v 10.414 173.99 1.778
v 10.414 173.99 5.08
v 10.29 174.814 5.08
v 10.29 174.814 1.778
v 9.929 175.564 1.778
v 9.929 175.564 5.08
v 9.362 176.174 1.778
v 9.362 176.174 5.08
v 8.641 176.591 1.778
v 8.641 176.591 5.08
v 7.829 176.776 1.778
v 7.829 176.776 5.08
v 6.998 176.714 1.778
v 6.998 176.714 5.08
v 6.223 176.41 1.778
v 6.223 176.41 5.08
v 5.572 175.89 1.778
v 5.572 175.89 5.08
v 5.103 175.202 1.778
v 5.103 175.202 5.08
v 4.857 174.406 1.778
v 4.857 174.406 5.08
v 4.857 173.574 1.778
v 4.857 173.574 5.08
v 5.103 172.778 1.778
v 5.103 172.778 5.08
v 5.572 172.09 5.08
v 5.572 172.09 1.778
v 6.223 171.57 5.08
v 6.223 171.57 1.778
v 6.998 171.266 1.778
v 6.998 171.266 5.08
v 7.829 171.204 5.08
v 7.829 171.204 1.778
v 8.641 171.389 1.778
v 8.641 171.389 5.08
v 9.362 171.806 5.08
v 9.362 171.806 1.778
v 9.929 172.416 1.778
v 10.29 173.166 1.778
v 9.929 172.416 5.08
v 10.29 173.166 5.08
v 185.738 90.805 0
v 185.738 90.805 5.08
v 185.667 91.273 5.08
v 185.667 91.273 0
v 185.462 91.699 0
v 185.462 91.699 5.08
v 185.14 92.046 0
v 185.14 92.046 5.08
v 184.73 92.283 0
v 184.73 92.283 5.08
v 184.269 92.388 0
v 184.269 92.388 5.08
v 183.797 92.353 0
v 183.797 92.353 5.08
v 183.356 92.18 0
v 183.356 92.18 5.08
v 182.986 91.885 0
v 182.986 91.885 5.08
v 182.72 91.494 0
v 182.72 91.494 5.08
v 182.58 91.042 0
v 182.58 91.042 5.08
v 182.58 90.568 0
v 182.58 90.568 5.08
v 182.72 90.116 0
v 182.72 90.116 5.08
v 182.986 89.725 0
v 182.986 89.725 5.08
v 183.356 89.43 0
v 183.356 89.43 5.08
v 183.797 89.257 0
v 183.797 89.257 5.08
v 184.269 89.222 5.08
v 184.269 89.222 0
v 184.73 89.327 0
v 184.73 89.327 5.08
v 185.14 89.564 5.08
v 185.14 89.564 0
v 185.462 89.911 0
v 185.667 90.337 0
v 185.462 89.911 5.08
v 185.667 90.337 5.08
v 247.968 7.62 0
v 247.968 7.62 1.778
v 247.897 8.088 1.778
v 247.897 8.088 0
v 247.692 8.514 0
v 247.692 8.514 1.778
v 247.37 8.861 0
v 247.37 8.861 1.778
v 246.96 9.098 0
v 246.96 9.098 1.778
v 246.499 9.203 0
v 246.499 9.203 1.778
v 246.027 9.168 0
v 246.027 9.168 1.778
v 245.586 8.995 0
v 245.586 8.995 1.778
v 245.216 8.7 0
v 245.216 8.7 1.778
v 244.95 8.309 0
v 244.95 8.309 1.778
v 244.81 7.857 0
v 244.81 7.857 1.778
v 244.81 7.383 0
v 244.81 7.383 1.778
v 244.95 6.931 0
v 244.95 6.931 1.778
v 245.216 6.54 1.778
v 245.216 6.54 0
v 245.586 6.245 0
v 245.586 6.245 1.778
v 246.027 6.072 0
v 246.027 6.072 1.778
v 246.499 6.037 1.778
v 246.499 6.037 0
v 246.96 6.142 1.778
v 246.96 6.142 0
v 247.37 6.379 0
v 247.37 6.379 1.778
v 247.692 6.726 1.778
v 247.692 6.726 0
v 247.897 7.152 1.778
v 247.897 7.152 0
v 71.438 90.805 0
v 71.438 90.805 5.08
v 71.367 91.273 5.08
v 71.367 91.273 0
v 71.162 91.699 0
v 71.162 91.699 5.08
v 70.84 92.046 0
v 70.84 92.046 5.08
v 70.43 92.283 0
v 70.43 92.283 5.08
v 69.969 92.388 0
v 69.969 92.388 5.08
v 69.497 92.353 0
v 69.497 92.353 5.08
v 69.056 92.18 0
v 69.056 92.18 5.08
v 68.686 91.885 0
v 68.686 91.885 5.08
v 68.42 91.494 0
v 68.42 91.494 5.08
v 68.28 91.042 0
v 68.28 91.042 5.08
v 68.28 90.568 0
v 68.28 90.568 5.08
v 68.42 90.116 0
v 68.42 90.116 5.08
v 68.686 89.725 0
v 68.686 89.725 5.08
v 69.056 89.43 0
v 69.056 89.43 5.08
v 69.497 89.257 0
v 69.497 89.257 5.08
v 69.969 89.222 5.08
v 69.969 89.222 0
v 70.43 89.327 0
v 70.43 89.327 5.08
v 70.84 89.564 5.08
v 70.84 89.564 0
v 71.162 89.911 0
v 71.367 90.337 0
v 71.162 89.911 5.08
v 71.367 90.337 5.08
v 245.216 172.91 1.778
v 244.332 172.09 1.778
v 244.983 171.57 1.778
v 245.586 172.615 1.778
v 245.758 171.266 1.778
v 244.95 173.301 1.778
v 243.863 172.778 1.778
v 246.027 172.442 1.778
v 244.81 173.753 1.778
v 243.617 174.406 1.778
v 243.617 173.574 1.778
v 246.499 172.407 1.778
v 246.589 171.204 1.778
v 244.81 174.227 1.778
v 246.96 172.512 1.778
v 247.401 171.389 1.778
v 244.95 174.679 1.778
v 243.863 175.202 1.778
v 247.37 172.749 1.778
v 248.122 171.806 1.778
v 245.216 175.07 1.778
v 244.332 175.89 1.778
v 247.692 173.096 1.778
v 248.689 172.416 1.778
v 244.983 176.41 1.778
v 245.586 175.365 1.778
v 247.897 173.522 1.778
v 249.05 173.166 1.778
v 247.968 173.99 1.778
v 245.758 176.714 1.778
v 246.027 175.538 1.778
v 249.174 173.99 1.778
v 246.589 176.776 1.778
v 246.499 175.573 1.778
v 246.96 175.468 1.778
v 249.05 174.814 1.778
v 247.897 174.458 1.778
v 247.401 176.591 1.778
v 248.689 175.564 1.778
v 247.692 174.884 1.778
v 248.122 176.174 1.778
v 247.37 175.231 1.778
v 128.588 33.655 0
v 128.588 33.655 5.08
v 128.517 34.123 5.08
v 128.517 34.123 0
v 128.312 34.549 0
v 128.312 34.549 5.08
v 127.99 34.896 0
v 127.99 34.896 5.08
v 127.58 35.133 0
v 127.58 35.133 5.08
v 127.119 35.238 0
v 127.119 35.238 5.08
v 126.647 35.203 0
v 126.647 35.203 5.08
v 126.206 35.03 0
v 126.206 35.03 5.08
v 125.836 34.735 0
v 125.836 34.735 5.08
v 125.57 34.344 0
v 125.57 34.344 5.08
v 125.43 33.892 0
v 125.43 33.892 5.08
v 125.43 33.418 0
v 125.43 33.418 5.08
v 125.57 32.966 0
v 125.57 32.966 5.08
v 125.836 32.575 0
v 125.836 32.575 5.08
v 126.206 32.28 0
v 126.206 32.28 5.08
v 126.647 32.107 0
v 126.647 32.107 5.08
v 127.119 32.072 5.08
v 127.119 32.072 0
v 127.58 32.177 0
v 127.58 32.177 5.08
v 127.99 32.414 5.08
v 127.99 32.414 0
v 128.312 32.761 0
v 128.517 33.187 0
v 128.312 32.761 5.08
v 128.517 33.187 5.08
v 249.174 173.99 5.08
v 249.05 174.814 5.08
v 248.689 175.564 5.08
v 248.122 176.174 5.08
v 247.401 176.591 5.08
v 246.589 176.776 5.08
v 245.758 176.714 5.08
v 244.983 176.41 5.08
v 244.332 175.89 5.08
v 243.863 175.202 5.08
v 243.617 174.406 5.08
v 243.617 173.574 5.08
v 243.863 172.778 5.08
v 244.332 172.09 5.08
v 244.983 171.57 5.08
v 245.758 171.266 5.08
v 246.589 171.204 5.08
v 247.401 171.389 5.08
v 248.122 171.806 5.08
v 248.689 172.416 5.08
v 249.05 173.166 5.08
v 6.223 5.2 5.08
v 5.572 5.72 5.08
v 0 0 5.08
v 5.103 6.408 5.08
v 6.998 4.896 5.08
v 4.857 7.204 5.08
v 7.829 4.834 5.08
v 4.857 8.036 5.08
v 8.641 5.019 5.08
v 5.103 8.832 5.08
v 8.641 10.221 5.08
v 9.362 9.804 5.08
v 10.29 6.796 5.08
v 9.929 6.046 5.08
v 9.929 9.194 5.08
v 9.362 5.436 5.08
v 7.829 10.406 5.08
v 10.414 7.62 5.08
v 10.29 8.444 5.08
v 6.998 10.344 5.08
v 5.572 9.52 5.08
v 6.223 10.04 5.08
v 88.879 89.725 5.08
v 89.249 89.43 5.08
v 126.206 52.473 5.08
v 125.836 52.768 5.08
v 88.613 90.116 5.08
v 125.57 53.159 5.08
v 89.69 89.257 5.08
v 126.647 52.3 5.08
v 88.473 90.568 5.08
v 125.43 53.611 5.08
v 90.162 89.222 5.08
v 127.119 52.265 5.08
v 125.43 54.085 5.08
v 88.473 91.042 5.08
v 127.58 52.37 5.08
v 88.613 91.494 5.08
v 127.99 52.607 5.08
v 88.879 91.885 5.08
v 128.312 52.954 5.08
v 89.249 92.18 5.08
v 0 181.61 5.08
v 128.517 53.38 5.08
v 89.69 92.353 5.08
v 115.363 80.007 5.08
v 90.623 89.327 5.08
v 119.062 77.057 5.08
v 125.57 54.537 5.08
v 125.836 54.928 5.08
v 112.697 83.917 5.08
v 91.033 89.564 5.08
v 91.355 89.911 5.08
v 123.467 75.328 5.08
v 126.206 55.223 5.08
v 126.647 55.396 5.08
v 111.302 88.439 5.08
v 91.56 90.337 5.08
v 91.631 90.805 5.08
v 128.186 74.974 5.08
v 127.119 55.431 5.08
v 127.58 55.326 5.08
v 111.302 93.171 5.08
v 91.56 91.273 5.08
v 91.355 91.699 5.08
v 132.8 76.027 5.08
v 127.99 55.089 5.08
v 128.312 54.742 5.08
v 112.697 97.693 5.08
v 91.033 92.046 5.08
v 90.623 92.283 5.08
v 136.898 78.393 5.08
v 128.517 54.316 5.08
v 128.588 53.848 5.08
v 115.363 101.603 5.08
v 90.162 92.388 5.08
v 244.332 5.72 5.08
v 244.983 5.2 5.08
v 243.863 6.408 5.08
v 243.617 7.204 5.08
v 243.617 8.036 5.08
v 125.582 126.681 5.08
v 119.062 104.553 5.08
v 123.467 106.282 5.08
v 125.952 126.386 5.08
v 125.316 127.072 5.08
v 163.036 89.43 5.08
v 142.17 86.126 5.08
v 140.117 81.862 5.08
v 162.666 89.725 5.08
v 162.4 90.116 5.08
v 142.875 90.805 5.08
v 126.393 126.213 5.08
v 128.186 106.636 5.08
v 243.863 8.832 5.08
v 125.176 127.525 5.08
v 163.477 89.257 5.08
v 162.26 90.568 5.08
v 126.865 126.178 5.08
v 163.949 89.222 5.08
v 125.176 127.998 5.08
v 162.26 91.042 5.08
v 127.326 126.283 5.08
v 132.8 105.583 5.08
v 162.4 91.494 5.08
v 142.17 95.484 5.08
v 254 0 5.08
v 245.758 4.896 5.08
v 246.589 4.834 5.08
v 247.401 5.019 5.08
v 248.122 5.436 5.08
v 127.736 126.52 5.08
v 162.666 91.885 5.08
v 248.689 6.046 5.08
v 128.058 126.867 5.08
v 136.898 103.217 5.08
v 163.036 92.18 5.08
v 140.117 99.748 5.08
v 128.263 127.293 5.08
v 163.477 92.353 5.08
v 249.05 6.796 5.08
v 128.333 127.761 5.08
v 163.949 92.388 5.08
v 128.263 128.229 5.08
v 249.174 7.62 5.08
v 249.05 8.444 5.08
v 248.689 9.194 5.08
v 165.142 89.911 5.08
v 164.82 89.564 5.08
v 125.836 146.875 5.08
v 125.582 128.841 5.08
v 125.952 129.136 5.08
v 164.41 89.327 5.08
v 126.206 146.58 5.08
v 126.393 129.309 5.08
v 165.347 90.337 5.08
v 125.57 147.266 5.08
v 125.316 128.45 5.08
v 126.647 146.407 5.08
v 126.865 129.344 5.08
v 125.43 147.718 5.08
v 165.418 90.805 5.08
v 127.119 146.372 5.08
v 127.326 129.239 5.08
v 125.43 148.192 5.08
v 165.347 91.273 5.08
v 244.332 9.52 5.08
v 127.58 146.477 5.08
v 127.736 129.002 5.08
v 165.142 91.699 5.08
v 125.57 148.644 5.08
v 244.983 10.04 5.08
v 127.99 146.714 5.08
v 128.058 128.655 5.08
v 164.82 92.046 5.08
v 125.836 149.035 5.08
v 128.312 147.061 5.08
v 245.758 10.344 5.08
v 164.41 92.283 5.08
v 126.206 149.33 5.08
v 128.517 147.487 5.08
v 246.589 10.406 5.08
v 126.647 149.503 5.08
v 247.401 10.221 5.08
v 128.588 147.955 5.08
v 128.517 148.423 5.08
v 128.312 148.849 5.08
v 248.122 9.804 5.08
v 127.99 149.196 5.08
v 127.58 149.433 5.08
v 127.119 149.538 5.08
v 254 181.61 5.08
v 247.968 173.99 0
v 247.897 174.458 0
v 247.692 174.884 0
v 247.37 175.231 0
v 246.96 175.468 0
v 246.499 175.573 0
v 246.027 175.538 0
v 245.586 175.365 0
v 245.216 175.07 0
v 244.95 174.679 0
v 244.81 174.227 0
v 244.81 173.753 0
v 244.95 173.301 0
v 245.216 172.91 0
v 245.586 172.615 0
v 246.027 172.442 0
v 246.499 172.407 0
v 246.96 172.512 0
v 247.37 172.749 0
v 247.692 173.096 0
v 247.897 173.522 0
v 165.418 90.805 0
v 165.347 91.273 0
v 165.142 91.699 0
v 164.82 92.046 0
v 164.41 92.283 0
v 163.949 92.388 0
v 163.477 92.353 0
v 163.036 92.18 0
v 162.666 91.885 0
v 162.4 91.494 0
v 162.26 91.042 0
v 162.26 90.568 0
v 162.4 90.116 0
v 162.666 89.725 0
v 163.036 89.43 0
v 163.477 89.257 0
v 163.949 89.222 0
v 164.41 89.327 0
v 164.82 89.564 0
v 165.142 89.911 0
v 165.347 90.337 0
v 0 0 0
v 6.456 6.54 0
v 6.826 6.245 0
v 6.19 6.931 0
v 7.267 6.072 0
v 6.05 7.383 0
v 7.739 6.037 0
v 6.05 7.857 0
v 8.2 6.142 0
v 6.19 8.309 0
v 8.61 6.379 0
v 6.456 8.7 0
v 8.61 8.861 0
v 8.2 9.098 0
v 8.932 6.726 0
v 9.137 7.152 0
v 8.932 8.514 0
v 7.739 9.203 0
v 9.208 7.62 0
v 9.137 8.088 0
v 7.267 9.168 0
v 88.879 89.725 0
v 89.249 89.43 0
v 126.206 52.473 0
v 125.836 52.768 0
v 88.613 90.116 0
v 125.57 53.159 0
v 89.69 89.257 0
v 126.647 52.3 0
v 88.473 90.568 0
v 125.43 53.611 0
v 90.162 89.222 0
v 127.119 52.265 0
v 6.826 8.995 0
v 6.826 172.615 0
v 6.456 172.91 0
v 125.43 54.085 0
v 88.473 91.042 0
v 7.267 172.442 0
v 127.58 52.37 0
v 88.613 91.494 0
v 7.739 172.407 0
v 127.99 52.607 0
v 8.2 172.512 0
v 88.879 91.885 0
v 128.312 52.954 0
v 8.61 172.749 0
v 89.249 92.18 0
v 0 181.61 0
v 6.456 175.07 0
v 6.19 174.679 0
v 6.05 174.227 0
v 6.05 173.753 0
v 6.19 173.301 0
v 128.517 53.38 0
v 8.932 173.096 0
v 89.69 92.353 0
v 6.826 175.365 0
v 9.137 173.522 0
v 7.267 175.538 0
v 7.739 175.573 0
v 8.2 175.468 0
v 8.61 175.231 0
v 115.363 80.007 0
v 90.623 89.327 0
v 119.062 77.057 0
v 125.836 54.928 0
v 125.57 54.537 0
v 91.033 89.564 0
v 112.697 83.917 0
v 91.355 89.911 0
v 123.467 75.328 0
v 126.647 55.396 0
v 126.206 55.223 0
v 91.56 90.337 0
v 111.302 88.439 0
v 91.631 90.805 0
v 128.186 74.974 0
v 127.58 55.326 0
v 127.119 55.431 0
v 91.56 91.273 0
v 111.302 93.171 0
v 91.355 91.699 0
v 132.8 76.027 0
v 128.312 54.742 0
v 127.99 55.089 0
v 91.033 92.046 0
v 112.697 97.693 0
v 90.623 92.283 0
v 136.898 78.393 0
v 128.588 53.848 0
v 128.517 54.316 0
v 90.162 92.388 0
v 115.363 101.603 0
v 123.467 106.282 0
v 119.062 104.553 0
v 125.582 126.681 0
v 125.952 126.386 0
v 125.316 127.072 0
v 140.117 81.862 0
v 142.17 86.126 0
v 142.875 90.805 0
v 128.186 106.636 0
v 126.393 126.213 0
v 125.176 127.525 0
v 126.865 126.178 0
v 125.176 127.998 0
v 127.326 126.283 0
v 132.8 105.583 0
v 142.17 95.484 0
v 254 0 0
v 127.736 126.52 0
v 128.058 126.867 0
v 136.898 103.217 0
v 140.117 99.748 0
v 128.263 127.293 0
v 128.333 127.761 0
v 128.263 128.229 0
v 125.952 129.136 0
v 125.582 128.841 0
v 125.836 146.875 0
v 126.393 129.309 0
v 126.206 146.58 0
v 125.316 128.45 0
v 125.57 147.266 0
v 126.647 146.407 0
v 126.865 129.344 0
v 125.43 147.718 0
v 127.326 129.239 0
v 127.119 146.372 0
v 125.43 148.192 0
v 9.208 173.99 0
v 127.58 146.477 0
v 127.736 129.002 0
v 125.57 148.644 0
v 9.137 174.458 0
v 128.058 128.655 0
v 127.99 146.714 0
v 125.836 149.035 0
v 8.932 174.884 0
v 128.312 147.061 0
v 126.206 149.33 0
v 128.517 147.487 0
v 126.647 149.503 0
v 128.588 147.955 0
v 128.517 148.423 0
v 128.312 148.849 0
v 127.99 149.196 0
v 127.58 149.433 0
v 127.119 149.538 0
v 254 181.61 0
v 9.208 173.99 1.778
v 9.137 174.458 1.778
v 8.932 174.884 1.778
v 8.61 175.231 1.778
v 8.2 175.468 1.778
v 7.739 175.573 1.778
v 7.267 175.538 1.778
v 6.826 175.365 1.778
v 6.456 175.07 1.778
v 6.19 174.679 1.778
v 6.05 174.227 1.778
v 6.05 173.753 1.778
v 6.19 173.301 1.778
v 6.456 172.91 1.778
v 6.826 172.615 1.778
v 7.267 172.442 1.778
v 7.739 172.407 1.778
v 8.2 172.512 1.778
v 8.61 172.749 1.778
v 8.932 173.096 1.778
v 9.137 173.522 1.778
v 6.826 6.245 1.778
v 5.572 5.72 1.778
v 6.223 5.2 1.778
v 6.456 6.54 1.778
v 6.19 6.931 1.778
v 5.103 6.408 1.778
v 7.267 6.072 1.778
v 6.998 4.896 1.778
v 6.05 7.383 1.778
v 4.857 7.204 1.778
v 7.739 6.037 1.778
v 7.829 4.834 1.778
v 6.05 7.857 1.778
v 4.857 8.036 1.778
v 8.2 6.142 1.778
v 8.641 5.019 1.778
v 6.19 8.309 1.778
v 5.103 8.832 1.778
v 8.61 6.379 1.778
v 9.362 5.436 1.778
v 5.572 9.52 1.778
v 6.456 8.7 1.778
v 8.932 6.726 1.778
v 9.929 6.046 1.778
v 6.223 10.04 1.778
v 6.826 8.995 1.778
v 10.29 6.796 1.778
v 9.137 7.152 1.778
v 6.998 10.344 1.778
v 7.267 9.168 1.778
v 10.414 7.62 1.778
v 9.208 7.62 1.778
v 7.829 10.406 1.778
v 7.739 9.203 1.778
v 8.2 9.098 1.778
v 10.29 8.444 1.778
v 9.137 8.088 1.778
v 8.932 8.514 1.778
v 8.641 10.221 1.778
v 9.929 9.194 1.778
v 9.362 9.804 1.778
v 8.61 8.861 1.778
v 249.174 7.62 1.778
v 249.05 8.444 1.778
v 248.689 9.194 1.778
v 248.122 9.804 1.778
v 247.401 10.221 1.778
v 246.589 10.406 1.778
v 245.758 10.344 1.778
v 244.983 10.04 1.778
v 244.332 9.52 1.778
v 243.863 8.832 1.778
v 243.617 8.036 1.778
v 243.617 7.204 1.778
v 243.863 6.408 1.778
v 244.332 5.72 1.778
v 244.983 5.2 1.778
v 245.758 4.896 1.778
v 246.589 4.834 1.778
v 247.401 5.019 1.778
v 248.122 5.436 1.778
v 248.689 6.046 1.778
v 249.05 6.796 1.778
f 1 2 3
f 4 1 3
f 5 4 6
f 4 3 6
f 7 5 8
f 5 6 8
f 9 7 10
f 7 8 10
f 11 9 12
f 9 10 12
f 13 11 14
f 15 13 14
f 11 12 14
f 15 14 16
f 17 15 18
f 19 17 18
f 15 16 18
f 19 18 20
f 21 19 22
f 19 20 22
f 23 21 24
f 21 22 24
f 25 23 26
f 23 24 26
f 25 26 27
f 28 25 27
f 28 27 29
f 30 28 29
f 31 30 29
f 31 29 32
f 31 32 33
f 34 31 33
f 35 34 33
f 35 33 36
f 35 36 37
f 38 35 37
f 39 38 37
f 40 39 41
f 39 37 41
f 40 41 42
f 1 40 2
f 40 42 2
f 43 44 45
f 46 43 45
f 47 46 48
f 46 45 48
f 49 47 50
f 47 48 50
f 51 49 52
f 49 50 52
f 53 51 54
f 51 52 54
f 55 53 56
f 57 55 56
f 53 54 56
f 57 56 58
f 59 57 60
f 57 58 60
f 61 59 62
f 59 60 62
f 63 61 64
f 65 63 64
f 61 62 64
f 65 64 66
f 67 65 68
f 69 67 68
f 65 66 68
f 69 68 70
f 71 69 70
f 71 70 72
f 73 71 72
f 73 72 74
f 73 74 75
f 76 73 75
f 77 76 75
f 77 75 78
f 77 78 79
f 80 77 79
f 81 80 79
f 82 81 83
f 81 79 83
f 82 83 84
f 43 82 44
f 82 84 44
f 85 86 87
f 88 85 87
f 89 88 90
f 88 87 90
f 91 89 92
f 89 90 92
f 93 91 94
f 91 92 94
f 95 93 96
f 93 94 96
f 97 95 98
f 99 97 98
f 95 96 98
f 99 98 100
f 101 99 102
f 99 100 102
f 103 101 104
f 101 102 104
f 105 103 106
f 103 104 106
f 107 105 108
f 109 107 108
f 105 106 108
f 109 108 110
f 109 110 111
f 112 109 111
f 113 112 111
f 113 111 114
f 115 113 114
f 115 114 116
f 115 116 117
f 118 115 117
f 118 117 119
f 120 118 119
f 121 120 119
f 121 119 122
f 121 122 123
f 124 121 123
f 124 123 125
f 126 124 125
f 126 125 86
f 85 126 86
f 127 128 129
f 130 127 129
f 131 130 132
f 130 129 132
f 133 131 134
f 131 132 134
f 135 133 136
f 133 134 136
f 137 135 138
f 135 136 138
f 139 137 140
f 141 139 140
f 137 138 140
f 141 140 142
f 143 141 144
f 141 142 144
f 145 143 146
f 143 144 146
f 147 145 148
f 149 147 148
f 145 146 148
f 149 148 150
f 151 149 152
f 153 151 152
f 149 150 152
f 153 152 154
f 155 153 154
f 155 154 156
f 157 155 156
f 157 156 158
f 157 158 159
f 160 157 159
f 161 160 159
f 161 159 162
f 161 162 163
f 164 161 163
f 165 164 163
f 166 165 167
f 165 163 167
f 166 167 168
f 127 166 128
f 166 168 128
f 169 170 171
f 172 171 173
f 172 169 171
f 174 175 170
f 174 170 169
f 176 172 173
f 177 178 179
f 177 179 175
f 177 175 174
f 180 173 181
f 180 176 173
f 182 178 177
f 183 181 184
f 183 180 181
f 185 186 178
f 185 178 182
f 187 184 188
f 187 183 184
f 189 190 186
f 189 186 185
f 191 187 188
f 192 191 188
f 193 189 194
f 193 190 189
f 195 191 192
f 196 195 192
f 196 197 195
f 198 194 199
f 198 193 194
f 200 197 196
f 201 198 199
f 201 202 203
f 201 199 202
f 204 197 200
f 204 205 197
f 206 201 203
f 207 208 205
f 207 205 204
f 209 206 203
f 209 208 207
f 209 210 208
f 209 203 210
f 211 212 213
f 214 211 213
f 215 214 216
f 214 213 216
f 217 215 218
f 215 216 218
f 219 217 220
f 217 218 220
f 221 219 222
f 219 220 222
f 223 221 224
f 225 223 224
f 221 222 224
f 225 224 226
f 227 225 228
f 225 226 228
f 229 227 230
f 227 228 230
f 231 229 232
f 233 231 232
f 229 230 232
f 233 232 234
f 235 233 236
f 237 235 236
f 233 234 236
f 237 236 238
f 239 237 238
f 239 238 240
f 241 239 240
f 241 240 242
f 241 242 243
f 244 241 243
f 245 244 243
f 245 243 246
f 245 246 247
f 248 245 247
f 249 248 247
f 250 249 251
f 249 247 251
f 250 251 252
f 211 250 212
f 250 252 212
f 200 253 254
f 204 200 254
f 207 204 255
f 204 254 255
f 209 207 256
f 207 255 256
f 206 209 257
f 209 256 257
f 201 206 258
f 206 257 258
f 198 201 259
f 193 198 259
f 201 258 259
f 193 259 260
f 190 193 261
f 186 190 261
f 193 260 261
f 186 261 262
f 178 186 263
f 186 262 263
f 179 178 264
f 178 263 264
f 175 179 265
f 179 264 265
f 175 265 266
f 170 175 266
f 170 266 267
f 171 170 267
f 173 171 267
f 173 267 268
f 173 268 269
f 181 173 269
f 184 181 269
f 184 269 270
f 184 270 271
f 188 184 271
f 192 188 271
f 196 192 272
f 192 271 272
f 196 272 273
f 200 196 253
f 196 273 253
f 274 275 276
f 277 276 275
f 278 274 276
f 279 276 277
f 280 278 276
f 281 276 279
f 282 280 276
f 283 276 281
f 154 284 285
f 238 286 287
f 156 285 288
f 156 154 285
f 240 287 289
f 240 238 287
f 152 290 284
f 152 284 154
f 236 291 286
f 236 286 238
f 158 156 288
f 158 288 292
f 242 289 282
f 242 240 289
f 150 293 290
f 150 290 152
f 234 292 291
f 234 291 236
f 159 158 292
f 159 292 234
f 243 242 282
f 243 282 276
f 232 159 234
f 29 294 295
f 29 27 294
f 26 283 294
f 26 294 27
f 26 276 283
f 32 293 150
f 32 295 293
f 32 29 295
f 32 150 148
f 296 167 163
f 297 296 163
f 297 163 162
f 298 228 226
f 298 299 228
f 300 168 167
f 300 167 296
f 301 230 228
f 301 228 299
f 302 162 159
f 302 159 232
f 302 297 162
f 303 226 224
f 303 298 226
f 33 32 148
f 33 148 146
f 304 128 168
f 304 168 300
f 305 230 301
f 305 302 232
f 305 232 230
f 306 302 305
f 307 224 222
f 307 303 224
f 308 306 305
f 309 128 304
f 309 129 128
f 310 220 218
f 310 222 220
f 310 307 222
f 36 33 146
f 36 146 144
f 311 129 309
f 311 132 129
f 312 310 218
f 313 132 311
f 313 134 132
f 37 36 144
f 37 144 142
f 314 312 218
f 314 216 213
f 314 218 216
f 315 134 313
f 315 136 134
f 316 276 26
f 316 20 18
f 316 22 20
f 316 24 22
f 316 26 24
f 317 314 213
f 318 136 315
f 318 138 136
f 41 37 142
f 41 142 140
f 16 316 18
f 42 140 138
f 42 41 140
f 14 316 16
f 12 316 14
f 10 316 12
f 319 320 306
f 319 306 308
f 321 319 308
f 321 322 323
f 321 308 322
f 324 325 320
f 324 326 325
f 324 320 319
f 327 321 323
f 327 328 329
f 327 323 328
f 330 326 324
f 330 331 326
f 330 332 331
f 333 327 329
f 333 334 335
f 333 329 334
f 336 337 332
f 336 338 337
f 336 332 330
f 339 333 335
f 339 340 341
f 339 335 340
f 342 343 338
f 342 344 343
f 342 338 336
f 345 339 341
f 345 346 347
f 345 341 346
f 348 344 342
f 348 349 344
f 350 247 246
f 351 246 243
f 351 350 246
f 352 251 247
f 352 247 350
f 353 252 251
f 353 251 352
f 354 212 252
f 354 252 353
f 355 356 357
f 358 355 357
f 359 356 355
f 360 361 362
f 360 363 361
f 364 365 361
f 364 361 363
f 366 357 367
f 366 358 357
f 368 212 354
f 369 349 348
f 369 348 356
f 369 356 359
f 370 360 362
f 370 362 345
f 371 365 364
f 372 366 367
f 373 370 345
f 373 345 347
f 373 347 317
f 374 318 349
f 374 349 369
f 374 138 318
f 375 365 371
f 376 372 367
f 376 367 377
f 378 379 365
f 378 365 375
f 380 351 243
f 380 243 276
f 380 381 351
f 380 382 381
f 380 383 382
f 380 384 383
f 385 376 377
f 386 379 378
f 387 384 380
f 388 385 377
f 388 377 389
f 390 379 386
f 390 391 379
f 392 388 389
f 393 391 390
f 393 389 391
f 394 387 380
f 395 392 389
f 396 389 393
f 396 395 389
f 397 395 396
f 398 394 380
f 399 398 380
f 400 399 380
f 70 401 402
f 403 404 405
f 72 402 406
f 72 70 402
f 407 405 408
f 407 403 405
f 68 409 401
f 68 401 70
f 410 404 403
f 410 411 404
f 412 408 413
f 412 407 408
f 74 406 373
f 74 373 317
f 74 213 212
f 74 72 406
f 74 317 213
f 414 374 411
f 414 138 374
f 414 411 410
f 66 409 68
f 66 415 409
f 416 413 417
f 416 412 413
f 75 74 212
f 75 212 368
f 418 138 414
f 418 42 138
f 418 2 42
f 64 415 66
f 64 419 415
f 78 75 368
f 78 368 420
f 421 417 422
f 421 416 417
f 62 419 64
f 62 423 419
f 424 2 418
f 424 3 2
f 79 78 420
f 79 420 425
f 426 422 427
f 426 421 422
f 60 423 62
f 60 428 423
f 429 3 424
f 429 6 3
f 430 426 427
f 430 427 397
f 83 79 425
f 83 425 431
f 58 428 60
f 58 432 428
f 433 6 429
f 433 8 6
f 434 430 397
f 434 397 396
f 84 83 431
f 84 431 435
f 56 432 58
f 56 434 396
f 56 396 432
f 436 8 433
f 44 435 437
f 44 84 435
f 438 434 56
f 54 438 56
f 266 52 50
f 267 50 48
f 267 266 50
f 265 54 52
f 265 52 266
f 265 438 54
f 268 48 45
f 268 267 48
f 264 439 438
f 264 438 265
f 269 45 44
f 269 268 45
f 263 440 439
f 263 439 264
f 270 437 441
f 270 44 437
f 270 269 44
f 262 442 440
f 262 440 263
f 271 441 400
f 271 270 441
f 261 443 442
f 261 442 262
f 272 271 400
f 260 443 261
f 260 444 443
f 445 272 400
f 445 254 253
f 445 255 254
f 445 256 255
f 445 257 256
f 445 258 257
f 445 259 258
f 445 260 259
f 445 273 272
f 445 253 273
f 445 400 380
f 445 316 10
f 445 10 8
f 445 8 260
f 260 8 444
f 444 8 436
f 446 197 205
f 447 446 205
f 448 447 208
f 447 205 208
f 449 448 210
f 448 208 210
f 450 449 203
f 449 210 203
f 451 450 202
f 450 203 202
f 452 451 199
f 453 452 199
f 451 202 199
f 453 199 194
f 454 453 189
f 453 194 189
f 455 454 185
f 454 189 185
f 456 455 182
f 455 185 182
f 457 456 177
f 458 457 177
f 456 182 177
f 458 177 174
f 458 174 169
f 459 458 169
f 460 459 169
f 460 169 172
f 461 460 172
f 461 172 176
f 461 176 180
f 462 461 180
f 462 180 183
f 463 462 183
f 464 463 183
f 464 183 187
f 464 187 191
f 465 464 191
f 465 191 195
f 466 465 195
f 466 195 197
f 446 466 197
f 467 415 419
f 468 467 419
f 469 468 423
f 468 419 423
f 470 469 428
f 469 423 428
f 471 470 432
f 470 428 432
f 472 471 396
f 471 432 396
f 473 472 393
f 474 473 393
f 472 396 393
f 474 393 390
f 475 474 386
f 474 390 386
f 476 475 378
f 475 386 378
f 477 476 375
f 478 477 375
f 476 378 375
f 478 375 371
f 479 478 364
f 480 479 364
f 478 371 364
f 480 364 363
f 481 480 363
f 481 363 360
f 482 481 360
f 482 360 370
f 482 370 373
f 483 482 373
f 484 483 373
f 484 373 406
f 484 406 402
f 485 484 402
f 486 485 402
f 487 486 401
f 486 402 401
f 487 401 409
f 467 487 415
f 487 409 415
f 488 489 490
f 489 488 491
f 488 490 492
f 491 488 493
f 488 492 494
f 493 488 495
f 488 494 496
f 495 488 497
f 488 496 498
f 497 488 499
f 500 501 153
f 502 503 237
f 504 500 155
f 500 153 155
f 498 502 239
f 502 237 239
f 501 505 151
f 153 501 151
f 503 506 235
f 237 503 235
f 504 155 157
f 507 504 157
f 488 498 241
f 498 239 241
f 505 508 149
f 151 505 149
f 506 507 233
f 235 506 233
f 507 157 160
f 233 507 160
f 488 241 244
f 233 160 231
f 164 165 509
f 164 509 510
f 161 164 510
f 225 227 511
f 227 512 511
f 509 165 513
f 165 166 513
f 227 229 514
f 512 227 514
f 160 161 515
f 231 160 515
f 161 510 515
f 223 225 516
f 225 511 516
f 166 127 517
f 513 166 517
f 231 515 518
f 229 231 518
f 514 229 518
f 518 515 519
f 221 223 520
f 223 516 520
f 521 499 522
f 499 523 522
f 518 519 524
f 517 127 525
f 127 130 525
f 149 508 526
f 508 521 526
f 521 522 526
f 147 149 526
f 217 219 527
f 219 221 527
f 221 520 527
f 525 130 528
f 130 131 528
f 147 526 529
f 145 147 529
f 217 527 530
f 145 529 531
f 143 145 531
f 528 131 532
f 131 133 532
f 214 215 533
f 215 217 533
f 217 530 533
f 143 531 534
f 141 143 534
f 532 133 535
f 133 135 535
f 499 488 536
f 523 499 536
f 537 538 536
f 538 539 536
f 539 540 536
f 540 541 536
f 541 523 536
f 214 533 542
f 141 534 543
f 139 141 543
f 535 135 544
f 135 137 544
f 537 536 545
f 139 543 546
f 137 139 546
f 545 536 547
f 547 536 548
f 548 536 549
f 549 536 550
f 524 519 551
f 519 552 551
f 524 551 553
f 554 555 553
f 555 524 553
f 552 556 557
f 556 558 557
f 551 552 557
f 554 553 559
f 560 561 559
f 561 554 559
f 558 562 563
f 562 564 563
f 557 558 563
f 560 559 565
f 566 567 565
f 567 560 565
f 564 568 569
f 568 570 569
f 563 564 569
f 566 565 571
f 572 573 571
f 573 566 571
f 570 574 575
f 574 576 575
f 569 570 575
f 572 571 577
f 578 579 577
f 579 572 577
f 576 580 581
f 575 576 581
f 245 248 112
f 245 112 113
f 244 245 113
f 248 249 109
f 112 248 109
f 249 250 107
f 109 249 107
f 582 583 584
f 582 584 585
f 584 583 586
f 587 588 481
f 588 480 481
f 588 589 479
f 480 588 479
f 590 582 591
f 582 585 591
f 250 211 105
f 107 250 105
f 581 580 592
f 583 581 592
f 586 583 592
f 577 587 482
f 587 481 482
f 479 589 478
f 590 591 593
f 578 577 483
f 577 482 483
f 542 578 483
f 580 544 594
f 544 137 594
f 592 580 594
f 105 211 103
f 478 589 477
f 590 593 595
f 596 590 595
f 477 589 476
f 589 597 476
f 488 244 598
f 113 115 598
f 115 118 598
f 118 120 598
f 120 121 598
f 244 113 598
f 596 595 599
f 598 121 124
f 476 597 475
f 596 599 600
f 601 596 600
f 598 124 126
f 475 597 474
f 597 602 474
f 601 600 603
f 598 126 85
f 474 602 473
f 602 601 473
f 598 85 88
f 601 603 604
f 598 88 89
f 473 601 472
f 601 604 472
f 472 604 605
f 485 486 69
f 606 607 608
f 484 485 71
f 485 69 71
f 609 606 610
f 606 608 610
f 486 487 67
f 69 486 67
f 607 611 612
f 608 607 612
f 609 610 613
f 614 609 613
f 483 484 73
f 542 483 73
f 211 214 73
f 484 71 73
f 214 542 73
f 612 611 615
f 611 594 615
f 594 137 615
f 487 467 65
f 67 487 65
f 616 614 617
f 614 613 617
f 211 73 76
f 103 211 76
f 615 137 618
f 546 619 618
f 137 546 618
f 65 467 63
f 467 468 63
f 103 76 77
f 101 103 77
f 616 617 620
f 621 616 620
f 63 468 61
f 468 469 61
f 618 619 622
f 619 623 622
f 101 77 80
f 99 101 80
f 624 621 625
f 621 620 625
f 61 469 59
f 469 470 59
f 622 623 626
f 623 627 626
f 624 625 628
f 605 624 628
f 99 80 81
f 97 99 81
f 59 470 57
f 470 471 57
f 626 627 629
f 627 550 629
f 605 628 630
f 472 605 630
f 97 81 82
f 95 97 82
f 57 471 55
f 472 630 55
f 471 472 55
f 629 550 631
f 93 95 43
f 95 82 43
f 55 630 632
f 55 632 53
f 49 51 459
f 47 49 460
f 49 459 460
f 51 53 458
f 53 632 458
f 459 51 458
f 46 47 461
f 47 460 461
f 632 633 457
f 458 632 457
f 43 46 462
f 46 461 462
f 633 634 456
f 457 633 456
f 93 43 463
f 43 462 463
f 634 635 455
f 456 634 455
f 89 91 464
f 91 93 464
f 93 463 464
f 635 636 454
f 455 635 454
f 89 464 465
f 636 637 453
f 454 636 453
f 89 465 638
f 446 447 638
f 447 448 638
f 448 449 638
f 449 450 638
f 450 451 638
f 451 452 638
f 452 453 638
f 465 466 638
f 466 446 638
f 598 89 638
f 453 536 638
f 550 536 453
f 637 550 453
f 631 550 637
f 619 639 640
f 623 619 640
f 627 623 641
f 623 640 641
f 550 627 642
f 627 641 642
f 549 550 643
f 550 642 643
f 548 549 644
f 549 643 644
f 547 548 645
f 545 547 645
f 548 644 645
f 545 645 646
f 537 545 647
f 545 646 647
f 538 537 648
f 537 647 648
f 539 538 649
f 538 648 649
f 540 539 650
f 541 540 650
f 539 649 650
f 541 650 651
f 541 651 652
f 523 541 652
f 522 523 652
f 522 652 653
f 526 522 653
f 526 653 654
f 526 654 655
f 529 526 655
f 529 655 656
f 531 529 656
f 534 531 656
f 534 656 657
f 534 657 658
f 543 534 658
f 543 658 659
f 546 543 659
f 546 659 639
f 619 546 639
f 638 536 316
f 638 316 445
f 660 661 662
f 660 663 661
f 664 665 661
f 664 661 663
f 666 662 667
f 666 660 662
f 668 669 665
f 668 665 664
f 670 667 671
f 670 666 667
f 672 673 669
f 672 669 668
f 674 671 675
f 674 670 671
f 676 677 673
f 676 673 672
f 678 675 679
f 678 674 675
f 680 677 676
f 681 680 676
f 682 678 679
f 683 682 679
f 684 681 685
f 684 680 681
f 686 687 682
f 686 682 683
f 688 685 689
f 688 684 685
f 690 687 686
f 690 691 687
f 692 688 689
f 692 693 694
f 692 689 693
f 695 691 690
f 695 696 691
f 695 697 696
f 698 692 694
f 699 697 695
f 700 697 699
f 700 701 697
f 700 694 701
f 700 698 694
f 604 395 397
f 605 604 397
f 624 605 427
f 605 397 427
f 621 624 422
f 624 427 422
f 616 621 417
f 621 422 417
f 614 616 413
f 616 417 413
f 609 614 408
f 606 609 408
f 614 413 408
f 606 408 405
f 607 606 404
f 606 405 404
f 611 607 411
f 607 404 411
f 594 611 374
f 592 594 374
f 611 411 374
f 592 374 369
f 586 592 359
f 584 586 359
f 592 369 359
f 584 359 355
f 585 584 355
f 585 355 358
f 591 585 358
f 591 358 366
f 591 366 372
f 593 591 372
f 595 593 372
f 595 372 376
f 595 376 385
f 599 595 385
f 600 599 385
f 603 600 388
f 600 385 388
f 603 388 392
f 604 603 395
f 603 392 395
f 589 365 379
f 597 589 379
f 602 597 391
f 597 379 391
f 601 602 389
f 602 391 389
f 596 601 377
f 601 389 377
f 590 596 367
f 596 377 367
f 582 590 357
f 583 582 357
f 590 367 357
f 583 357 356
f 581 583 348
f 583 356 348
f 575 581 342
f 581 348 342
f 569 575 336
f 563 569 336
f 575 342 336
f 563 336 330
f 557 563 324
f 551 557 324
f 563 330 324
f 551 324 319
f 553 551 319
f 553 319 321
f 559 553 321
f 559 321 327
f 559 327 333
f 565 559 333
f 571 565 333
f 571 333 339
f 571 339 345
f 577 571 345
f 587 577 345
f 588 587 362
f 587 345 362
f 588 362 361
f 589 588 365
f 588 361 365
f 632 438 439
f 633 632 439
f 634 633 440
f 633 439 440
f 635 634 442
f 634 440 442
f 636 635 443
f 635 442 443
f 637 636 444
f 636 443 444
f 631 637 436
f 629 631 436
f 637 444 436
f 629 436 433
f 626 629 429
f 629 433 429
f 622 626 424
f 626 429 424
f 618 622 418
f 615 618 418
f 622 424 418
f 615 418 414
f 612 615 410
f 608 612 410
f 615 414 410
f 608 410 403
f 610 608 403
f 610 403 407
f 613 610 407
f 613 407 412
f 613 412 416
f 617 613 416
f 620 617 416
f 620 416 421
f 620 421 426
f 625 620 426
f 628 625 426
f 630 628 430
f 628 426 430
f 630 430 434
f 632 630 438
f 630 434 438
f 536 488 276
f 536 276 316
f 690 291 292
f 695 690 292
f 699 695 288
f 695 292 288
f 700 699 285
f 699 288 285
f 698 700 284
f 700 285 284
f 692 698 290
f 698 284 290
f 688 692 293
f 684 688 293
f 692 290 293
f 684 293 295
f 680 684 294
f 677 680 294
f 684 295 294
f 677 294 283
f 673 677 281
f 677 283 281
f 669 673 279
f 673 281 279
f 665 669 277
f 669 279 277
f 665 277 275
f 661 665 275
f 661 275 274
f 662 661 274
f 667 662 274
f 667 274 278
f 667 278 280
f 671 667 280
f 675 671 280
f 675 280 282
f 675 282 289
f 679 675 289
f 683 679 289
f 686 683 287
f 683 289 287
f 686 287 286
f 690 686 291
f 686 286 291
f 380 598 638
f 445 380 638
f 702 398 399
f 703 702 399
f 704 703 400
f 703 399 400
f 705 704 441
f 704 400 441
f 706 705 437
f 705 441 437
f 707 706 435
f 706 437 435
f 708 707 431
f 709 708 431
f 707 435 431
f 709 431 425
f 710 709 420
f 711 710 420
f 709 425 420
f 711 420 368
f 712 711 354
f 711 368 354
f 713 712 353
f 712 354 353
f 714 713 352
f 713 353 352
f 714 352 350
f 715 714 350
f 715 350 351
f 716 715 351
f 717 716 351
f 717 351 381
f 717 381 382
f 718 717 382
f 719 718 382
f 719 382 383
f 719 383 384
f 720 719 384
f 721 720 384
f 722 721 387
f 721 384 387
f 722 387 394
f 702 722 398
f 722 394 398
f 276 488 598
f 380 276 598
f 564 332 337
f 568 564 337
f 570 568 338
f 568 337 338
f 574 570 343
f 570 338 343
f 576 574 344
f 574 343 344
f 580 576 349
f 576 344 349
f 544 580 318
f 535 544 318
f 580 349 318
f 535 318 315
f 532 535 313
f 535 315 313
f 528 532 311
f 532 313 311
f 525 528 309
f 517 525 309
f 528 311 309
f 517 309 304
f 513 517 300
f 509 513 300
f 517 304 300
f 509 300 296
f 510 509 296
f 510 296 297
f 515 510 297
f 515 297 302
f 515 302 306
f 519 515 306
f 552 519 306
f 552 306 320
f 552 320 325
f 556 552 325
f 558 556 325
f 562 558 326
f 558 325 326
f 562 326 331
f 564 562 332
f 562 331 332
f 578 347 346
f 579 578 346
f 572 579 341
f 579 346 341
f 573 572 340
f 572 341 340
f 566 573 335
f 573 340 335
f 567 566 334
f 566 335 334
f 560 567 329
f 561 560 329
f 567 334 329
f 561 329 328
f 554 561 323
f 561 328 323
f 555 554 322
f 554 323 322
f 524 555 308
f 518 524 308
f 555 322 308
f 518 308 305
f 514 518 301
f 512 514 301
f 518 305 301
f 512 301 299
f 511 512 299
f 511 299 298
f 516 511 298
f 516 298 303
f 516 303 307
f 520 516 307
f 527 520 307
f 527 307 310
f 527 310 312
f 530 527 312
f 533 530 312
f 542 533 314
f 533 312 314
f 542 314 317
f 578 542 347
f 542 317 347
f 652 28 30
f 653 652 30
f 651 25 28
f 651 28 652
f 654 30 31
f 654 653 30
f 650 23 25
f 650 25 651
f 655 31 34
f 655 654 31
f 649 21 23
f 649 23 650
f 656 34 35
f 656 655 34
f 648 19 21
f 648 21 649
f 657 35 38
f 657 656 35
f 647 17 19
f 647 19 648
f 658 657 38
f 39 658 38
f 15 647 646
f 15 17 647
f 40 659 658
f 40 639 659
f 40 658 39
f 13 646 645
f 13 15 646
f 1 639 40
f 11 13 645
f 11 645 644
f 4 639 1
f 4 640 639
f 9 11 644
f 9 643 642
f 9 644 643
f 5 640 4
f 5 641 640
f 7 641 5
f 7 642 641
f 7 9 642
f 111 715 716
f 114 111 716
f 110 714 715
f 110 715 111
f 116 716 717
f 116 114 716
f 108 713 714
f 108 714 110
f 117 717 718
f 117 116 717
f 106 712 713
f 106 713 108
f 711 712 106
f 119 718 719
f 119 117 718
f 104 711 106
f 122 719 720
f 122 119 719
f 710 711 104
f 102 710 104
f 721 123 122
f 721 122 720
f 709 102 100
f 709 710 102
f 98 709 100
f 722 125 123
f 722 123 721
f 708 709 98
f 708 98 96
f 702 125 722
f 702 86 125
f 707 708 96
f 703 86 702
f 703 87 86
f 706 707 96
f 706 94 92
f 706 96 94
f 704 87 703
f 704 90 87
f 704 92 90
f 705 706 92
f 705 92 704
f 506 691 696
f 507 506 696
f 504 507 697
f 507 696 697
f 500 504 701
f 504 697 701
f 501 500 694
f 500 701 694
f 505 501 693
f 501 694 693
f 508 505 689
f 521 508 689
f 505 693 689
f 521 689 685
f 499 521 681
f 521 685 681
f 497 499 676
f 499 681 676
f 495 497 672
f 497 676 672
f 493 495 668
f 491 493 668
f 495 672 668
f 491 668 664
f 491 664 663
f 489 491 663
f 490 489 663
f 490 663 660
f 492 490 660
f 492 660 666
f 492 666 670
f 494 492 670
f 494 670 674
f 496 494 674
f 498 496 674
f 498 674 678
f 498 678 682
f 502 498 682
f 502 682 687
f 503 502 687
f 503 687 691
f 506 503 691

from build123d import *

# Parameters (mm, degrees)
SKETCH1_W           = 254
SKETCH1_H           = 181.61
BOSS_EXTRUDE1_DEPTH = 5.08
SKETCH2_R           = 15.875
CUT_EXTRUDE1_DEPTH  = 5.08
SKETCH3_R           = 1.5875
CUT_EXTRUDE3_DEPTH  = 7.62
SKETCH5_R           = 2.794
CUT_EXTRUDE5_DEPTH  = 3.302
SKETCH6_R           = 1.5875
CUT_EXTRUDE6_DEPTH  = 5.08


with BuildPart() as part:
    # Sketch1 → Boss-Extrude1 (new body)
    with BuildSketch(Plane.XY):
        with Locations((127, 90.805)):
            Rectangle(SKETCH1_W, SKETCH1_H)
    extrude(amount=BOSS_EXTRUDE1_DEPTH)

    # Sketch2 → Cut-Extrude1 (cut)
    with BuildSketch(Plane.XY.offset(5.08)):
        with Locations((127, 90.805)):
            Circle(SKETCH2_R)
    extrude(amount=-CUT_EXTRUDE1_DEPTH, mode=Mode.SUBTRACT)

    # Sketch3 → Cut-Extrude3 (cut)
    with BuildSketch(Plane.XY.offset(5.08)):
        with Locations((7.62, 173.99)):
            Circle(SKETCH3_R)
        with Locations((246.38, 173.99)):
            Circle(SKETCH3_R)
        with Locations((7.62, 7.62)):
            Circle(SKETCH3_R)
        with Locations((246.38, 7.62)):
            Circle(SKETCH3_R)
    extrude(amount=-CUT_EXTRUDE3_DEPTH, mode=Mode.SUBTRACT)

    # Sketch5 → Cut-Extrude5 (cut)
    with BuildSketch(Plane.XY.offset(5.08)):
        with Locations((246.38, 173.99)):
            Circle(SKETCH5_R)
        with Locations((246.38, 7.62)):
            Circle(SKETCH5_R)
        with Locations((7.62, 173.99)):
            Circle(SKETCH5_R)
        with Locations((7.62, 7.62)):
            Circle(SKETCH5_R)
    extrude(amount=-CUT_EXTRUDE5_DEPTH, mode=Mode.SUBTRACT)

    # Sketch6 → Cut-Extrude6 (cut)
    with BuildSketch(Plane.XY.offset(5.08)):
        with Locations((127, 147.955)):
            Circle(SKETCH6_R)
        with Locations((184.15, 90.805)):
            Circle(SKETCH6_R)
        with Locations((127, 33.655)):
            Circle(SKETCH6_R)
        with Locations((69.85, 90.805)):
            Circle(SKETCH6_R)
        with Locations((163.83, 90.805)):
            Circle(SKETCH6_R)
        with Locations((127, 53.848)):
            Circle(SKETCH6_R)
        with Locations((90.043, 90.805)):
            Circle(SKETCH6_R)
        with Locations((126.746, 127.761127137)):
            Circle(SKETCH6_R)
    extrude(amount=-CUT_EXTRUDE6_DEPTH, mode=Mode.SUBTRACT)


solid = part.part
